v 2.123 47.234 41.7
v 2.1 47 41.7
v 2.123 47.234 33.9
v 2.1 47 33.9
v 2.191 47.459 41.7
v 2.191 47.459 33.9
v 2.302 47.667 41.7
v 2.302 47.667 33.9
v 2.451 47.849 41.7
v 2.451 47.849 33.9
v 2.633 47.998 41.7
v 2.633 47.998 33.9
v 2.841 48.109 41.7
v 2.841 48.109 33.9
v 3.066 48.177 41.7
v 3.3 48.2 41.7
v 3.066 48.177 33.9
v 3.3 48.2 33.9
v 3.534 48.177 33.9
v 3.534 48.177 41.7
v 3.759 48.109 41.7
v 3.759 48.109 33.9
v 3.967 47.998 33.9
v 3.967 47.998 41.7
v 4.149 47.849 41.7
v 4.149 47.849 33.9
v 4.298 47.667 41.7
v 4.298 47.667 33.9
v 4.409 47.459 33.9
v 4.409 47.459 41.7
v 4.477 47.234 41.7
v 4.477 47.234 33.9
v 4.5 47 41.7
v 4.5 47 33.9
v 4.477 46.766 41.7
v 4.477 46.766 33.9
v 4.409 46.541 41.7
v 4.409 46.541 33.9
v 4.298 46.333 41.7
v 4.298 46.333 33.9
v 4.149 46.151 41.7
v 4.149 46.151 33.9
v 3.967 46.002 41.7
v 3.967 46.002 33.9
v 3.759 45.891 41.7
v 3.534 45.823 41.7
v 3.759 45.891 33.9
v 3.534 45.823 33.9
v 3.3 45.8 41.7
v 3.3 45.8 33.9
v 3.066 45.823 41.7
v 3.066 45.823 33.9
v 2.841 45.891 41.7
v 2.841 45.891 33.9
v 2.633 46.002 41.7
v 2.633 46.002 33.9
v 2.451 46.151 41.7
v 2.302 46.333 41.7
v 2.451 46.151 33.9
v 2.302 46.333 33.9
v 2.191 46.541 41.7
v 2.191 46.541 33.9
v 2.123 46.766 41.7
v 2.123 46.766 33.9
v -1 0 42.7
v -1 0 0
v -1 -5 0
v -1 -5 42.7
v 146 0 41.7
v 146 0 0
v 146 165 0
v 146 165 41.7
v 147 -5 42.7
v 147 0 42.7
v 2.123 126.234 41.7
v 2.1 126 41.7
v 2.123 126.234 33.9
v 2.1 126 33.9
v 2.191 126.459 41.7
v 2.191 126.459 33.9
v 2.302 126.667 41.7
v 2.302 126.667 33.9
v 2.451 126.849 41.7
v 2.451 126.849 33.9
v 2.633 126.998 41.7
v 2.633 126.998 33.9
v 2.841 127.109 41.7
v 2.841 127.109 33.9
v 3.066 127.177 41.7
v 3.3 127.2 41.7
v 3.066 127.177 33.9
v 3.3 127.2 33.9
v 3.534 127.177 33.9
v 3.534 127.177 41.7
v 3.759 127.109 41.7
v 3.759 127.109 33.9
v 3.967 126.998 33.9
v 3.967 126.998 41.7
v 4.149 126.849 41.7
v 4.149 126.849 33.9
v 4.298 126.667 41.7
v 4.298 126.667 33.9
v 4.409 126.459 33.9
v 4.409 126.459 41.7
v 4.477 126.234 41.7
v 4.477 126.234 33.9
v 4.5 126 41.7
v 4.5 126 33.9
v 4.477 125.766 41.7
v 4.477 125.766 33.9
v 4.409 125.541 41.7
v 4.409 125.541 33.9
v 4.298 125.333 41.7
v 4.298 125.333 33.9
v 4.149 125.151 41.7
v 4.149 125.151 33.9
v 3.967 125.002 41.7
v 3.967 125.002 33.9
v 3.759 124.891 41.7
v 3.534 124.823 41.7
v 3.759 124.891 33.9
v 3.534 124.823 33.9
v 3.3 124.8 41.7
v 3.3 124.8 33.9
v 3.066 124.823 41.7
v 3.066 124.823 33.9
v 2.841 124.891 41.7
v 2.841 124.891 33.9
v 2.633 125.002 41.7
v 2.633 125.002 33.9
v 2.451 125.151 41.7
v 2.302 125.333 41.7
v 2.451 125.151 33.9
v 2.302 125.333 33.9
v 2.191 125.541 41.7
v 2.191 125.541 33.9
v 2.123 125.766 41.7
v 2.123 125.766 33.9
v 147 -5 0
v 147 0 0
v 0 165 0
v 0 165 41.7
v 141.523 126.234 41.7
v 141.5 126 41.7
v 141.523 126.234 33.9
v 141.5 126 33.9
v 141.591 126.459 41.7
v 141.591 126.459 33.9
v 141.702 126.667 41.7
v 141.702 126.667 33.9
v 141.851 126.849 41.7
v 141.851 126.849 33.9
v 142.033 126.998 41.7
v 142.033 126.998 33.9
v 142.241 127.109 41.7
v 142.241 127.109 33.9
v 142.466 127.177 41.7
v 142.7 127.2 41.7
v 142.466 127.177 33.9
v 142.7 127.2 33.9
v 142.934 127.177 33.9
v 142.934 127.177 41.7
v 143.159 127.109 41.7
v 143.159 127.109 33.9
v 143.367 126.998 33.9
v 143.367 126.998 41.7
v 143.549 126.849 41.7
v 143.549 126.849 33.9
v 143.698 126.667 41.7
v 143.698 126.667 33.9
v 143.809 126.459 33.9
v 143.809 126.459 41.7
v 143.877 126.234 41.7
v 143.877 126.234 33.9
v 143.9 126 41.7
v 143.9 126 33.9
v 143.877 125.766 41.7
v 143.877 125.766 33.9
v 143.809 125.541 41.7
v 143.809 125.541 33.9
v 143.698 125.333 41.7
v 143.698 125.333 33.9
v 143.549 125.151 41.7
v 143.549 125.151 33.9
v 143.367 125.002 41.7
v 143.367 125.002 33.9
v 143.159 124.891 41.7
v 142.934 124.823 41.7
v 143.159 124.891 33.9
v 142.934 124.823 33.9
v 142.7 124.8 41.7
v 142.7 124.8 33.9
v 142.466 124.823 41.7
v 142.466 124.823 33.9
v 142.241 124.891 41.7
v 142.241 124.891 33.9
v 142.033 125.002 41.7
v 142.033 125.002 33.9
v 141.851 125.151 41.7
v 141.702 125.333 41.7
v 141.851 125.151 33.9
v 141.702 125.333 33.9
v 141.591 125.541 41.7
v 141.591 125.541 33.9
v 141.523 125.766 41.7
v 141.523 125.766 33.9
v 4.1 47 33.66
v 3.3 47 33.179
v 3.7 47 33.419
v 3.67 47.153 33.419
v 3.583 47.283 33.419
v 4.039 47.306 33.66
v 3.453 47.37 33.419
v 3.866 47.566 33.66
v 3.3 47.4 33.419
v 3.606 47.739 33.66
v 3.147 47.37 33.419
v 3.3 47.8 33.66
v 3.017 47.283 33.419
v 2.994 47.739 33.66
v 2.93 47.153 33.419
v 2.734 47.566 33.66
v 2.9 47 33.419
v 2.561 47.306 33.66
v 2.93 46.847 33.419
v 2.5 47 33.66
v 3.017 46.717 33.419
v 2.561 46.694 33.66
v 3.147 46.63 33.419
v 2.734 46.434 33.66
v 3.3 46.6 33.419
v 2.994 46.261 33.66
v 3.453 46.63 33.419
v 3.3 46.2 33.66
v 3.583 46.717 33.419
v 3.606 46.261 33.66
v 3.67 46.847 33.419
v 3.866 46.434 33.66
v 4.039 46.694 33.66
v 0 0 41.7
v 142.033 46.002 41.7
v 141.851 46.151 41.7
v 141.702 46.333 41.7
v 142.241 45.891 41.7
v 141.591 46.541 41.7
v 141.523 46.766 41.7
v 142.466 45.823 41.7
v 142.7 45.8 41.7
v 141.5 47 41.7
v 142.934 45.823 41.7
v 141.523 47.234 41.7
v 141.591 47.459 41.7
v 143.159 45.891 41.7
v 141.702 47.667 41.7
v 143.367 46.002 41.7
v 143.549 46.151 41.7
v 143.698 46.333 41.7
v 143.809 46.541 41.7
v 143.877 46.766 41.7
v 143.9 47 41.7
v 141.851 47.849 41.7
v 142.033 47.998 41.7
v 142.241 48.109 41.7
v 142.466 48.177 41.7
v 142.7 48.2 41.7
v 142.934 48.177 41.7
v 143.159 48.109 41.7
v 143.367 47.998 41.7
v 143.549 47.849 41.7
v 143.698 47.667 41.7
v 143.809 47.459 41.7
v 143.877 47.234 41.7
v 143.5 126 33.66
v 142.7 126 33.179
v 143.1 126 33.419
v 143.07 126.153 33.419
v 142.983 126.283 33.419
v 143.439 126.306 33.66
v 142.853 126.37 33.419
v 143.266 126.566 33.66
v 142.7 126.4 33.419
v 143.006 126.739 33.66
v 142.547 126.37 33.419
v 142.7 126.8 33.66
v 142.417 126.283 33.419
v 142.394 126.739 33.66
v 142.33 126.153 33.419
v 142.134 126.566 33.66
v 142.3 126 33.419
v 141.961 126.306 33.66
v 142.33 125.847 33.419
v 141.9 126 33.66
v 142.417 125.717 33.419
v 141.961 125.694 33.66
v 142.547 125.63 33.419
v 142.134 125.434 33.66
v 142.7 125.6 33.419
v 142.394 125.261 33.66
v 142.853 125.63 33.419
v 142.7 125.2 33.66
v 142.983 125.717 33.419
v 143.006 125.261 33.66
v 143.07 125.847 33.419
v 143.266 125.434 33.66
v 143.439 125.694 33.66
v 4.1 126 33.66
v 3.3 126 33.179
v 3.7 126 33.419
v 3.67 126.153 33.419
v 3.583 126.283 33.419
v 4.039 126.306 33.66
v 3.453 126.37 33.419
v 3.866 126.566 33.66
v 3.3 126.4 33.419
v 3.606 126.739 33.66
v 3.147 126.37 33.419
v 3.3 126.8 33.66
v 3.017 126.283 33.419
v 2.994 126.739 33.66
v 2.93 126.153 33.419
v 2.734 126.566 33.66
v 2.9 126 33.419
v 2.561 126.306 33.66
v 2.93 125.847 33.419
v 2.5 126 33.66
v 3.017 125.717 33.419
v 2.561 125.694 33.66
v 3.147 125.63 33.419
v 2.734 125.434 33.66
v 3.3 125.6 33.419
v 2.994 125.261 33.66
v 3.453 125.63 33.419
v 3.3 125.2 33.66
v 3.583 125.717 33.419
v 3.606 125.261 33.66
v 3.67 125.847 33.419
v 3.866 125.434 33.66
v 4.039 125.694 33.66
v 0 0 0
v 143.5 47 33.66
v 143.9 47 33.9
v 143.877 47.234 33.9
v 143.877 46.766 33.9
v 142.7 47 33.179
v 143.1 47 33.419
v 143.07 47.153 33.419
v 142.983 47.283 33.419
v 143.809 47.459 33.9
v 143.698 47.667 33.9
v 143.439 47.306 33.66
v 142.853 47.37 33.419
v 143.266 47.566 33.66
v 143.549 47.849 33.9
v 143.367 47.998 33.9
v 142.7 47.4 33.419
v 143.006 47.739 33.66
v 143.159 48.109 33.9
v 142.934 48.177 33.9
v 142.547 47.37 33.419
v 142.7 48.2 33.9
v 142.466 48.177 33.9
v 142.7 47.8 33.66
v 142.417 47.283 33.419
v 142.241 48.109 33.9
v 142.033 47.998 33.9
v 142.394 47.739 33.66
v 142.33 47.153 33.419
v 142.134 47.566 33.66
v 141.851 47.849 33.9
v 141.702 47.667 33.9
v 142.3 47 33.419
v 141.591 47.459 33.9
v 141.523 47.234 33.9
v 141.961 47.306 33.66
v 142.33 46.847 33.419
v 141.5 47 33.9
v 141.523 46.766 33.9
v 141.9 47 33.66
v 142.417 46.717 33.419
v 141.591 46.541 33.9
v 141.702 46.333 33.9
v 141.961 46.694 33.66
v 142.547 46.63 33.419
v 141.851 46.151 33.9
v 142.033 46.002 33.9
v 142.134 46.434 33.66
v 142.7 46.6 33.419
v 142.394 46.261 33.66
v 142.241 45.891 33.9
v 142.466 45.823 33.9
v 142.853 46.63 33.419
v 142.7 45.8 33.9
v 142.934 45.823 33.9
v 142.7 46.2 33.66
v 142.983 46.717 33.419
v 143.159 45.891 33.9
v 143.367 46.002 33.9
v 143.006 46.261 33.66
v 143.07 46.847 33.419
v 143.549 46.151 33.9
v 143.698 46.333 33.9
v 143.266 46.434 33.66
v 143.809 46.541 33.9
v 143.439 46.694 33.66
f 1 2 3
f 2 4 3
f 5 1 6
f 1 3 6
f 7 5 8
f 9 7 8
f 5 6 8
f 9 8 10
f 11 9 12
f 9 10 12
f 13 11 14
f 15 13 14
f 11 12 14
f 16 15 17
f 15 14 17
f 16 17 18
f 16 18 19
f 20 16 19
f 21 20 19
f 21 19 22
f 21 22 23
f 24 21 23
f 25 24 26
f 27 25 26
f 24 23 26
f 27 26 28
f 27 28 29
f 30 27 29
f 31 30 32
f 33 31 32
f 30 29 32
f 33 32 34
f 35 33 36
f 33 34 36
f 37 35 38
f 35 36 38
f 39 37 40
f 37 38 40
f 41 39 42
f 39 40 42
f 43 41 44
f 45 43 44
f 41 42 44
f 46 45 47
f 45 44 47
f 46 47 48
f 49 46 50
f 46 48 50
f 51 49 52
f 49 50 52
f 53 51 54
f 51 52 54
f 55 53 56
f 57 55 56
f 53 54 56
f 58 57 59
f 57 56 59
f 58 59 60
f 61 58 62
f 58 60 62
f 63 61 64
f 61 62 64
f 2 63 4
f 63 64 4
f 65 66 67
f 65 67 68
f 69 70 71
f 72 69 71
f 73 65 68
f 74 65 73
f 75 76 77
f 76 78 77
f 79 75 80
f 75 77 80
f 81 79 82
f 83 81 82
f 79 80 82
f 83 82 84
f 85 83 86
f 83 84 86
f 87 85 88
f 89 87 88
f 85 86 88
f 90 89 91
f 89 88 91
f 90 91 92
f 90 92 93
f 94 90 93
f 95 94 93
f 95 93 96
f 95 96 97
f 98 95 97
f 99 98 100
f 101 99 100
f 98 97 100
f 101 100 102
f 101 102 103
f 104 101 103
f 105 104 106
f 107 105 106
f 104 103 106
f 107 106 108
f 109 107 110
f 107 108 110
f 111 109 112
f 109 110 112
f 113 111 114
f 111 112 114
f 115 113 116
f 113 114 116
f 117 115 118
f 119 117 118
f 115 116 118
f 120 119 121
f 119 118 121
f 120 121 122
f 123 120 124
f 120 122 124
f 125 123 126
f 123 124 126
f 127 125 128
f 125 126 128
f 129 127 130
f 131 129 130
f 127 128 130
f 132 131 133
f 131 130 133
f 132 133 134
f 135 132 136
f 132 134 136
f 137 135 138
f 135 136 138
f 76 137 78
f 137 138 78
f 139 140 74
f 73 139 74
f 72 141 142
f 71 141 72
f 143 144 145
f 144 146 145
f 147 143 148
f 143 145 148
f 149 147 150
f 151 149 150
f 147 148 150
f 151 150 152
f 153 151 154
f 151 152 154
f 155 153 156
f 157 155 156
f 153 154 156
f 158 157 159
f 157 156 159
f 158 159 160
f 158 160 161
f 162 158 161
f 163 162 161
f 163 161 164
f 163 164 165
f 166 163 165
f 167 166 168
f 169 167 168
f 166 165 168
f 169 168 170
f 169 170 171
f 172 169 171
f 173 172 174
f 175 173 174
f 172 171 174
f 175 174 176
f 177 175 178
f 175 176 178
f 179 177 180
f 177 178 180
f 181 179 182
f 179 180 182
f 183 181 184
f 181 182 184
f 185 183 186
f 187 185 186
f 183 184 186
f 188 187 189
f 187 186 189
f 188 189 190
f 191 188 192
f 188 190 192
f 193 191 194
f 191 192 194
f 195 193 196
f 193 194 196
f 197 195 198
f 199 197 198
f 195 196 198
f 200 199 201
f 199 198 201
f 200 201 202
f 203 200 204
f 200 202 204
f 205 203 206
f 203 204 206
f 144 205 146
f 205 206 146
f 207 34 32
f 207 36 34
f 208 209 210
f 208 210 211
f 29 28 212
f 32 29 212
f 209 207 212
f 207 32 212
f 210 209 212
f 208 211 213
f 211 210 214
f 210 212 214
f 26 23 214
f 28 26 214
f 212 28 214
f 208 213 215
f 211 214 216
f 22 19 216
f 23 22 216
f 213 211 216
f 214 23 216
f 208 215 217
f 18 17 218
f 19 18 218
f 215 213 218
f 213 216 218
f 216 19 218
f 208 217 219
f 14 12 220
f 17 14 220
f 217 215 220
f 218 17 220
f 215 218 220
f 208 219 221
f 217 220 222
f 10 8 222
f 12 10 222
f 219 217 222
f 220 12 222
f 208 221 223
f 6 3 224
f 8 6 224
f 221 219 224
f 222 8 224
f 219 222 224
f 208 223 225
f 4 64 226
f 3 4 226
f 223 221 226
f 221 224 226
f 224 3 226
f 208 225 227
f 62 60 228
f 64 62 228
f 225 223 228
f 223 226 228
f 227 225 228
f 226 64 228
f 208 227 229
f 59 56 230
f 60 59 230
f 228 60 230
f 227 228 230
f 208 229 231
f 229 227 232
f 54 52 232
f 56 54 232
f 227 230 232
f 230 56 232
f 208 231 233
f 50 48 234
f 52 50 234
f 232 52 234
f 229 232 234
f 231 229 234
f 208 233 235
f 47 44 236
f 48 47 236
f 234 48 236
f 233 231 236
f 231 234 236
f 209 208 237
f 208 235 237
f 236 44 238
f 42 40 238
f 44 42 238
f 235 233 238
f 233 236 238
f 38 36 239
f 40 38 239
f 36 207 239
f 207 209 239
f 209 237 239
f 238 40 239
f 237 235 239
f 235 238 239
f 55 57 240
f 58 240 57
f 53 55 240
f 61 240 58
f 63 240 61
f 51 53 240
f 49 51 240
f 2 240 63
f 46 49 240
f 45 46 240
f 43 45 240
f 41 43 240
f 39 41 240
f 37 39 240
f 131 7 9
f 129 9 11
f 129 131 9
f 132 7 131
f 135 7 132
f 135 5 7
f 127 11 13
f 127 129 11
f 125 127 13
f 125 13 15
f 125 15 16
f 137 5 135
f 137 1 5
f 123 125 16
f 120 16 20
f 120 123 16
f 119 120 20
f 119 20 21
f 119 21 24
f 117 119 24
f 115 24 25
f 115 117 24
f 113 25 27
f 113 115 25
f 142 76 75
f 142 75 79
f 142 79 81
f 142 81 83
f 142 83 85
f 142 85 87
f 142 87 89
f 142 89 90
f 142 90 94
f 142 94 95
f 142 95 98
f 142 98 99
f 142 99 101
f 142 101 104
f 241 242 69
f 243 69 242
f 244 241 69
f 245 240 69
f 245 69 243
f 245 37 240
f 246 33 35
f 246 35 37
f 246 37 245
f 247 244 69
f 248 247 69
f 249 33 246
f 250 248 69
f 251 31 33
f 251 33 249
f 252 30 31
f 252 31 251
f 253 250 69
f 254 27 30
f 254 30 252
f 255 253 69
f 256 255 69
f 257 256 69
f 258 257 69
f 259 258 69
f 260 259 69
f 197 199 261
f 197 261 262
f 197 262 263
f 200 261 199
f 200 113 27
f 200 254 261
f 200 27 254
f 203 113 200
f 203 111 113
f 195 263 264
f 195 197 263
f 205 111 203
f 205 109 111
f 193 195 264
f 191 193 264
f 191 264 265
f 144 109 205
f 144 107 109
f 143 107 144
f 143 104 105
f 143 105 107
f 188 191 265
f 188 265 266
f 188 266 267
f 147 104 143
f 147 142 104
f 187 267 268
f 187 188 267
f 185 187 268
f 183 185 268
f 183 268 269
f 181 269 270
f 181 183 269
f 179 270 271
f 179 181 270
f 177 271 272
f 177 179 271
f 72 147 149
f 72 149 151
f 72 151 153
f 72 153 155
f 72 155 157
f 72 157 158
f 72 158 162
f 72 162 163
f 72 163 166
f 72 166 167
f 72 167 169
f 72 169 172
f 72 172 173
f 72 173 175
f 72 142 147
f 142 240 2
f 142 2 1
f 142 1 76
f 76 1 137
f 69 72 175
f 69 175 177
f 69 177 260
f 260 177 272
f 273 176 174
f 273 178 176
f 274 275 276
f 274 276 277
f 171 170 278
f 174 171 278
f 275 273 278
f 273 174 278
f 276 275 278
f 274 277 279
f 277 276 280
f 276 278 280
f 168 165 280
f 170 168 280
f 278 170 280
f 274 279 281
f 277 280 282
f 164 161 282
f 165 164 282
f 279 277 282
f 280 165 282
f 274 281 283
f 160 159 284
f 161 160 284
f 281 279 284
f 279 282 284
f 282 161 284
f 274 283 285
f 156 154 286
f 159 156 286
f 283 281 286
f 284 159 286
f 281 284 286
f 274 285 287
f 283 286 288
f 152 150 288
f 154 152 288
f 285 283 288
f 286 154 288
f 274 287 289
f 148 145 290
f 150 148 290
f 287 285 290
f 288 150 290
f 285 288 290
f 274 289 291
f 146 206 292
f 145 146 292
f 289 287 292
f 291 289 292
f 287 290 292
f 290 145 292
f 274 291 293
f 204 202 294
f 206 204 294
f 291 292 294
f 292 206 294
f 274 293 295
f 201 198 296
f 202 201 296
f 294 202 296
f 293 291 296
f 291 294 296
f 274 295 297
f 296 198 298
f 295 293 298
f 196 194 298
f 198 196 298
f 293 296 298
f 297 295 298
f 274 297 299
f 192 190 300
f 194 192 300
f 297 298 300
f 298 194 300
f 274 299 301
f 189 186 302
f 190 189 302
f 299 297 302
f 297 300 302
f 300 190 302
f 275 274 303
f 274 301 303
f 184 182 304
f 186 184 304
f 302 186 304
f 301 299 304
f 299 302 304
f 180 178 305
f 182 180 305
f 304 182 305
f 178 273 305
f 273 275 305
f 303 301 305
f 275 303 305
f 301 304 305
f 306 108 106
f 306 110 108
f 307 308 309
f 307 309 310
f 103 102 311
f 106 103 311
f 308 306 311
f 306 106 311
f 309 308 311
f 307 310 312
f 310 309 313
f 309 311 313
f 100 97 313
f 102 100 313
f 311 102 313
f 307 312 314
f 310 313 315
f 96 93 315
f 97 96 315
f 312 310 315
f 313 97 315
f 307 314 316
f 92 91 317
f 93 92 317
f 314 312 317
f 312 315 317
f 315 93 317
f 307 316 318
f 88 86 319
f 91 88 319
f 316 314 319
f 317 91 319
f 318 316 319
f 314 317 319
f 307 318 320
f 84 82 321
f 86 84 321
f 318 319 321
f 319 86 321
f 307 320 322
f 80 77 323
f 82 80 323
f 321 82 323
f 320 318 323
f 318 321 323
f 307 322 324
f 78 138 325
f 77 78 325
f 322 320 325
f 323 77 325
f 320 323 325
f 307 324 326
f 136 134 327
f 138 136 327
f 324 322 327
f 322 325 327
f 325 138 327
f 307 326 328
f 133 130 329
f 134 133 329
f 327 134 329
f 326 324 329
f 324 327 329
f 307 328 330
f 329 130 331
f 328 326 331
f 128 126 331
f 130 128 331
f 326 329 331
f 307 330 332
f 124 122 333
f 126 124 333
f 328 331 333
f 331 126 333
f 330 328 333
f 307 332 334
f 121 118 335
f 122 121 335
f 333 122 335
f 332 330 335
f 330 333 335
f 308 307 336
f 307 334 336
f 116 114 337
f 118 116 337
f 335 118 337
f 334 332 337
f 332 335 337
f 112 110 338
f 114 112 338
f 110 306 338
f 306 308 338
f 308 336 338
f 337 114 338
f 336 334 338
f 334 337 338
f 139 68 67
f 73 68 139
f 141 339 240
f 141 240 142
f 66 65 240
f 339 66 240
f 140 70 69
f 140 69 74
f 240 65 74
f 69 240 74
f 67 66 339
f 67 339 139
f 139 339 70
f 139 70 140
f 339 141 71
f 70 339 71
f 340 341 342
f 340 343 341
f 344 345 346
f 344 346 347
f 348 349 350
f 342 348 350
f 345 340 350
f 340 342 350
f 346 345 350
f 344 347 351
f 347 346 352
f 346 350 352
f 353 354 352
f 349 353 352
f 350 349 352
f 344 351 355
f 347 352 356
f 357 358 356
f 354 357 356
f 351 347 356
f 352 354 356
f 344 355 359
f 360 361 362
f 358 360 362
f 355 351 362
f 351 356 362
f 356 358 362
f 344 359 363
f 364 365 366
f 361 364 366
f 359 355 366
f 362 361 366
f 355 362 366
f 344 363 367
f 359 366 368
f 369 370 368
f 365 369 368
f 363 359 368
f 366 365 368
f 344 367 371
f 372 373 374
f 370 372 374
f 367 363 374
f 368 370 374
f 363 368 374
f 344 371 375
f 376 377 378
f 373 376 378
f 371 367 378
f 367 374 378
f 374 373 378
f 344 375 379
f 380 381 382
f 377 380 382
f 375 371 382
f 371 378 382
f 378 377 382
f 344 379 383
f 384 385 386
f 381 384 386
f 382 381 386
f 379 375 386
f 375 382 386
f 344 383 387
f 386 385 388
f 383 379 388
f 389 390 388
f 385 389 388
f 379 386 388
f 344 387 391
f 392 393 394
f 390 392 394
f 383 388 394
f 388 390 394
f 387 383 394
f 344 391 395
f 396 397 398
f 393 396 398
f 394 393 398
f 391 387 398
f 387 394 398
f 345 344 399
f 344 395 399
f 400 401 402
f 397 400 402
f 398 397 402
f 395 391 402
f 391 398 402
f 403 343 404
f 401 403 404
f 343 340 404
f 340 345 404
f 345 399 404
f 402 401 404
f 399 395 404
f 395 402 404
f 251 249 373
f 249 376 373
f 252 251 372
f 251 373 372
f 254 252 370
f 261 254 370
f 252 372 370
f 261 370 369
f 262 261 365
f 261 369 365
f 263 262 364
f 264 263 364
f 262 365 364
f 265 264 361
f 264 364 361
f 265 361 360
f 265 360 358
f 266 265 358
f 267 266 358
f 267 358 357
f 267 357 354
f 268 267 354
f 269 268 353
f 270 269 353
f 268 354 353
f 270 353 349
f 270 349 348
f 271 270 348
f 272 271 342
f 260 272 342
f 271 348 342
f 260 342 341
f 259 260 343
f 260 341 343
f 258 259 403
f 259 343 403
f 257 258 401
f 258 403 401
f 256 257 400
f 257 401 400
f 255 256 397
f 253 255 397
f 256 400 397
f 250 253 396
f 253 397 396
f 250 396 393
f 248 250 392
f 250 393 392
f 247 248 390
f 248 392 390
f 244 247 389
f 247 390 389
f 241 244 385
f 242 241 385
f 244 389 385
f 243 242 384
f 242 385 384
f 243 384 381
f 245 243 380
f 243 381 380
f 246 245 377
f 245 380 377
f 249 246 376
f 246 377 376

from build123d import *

# Parameters (mm, degrees)
F0_W     = 146
F0_H     = 165
F1_DEPTH = 41.7
F2_W     = 148
F2_H     = 42.7
F3_DEPTH = 5
F5_D     = 2.4
F5_DEPTH = 7.8
F5_TIP   = 0.7210327428


with BuildPart() as f1:
    # F0 (on Top) → F1 (new body)
    with BuildSketch(Plane.XY):
        with Locations((73, 82.5)):
            Rectangle(F0_W, F0_H)
    extrude(amount=F1_DEPTH)

    # F2 (on face) → F3 (join)
    with BuildSketch(Plane.XZ):
        with Locations((73, 21.35)):
            Rectangle(F2_W, F2_H)
    extrude(amount=F3_DEPTH)

    # F5
    with Locations(Plane.XY.offset(41.7)):
        with Locations((3.3, 126), (142.7, 126), (142.7, 47), (3.3, 47)):
            Hole(F5_D / 2, depth=F5_DEPTH)
            with Locations((0, 0, -(F5_DEPTH + F5_TIP / 2))):  # 118° drill point
                Cone(0, F5_D / 2, F5_TIP, mode=Mode.SUBTRACT)


solid = f1.part
